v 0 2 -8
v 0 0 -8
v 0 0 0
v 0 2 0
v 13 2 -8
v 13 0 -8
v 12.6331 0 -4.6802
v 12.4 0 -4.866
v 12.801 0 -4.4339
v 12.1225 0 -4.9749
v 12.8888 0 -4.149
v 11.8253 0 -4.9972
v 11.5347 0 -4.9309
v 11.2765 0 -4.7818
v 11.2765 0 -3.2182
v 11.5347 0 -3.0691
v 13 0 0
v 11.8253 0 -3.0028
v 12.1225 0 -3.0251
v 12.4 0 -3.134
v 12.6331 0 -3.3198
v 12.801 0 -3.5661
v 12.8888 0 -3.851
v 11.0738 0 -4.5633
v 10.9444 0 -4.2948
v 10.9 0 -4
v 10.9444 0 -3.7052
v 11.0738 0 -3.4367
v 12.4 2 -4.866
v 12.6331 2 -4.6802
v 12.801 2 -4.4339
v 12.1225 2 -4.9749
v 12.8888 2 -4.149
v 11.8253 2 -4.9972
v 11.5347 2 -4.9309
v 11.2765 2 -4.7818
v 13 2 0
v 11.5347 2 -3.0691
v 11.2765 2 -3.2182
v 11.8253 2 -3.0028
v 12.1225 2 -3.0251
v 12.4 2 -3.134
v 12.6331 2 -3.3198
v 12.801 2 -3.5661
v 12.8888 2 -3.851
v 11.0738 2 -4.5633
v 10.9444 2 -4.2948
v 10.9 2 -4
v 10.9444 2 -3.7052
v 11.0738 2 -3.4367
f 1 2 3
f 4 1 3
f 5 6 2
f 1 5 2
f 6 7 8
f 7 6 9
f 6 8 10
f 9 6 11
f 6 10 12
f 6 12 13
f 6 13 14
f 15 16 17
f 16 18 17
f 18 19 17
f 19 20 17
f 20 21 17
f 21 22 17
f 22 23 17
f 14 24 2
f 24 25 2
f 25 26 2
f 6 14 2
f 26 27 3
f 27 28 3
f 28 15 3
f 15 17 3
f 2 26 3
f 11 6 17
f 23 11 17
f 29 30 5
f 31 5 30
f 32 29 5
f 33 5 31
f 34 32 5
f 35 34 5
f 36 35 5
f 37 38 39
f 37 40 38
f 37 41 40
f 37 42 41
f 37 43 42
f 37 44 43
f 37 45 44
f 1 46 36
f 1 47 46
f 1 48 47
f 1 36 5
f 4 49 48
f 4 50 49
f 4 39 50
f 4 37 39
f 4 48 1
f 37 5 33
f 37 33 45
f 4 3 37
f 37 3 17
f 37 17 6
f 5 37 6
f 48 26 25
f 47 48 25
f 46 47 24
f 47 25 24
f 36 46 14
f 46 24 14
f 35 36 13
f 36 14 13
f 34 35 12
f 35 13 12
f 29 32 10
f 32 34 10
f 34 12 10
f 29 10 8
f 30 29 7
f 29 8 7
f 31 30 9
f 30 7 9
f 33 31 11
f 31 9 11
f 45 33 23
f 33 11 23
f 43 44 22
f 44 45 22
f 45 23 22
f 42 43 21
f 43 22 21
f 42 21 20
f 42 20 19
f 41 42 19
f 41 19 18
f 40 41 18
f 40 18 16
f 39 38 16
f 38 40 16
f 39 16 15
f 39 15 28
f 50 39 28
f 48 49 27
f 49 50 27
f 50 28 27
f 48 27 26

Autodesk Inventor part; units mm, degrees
ref_plane "YZ Plane" through (0, 0, 0) normal (1, 0, 0) x (0, 1, 0)
ref_plane "XZ Plane" through (0, 0, 0) normal (0, 1, 0) x (-1, 0, 0)
ref_plane "XY Plane" through (0, 0, 0) normal (0, 0, 1) x (1, 0, 0)
sketch "Boceto1" plane through (0, 0, 0) normal (0, 1, 0) x (-1, 0, 0)
  line L0 (0, 0) -> (-13, 0)
  line L1 (-13, 0) -> (-13, -8)
  line L2 (-13, -8) -> (0, -8)
  line L3 (0, -8) -> (0, 0)
  circle A0 centre (-11.9, -4) radius 1
  dimension "d0" = 13
  dimension "d1" = 8
  dimension "d2" = 2
  dimension "d3" = 1.1
  dimension "d4" = 4
  dimension "d5" = 4
extrude "Extrusión1" add sketch "Boceto1" along normal blind 2
equation "\"Radio_pliegue\" = Grosor"
equation "\"Anchura_desahogo_plegado\" = Grosor"
equation "\"Profundidad_desahogo_plegado\" = 0.5 * Grosor"
equation "\"Tamaño_destalonado\" = 4 * Grosor"
equation "\"Remanente_mínimo\" = 2 * Grosor"
equation "\"Radiodetransición\" = Radio_pliegue"
equation "\"Tamaño_de_radio_de_Jacobi\" = Radio_pliegue"
equation "\"TamañoSeparación\" = Grosor"
equation "\"Grosor\" = 0.5"
properties part number "SensorDeLinea"
